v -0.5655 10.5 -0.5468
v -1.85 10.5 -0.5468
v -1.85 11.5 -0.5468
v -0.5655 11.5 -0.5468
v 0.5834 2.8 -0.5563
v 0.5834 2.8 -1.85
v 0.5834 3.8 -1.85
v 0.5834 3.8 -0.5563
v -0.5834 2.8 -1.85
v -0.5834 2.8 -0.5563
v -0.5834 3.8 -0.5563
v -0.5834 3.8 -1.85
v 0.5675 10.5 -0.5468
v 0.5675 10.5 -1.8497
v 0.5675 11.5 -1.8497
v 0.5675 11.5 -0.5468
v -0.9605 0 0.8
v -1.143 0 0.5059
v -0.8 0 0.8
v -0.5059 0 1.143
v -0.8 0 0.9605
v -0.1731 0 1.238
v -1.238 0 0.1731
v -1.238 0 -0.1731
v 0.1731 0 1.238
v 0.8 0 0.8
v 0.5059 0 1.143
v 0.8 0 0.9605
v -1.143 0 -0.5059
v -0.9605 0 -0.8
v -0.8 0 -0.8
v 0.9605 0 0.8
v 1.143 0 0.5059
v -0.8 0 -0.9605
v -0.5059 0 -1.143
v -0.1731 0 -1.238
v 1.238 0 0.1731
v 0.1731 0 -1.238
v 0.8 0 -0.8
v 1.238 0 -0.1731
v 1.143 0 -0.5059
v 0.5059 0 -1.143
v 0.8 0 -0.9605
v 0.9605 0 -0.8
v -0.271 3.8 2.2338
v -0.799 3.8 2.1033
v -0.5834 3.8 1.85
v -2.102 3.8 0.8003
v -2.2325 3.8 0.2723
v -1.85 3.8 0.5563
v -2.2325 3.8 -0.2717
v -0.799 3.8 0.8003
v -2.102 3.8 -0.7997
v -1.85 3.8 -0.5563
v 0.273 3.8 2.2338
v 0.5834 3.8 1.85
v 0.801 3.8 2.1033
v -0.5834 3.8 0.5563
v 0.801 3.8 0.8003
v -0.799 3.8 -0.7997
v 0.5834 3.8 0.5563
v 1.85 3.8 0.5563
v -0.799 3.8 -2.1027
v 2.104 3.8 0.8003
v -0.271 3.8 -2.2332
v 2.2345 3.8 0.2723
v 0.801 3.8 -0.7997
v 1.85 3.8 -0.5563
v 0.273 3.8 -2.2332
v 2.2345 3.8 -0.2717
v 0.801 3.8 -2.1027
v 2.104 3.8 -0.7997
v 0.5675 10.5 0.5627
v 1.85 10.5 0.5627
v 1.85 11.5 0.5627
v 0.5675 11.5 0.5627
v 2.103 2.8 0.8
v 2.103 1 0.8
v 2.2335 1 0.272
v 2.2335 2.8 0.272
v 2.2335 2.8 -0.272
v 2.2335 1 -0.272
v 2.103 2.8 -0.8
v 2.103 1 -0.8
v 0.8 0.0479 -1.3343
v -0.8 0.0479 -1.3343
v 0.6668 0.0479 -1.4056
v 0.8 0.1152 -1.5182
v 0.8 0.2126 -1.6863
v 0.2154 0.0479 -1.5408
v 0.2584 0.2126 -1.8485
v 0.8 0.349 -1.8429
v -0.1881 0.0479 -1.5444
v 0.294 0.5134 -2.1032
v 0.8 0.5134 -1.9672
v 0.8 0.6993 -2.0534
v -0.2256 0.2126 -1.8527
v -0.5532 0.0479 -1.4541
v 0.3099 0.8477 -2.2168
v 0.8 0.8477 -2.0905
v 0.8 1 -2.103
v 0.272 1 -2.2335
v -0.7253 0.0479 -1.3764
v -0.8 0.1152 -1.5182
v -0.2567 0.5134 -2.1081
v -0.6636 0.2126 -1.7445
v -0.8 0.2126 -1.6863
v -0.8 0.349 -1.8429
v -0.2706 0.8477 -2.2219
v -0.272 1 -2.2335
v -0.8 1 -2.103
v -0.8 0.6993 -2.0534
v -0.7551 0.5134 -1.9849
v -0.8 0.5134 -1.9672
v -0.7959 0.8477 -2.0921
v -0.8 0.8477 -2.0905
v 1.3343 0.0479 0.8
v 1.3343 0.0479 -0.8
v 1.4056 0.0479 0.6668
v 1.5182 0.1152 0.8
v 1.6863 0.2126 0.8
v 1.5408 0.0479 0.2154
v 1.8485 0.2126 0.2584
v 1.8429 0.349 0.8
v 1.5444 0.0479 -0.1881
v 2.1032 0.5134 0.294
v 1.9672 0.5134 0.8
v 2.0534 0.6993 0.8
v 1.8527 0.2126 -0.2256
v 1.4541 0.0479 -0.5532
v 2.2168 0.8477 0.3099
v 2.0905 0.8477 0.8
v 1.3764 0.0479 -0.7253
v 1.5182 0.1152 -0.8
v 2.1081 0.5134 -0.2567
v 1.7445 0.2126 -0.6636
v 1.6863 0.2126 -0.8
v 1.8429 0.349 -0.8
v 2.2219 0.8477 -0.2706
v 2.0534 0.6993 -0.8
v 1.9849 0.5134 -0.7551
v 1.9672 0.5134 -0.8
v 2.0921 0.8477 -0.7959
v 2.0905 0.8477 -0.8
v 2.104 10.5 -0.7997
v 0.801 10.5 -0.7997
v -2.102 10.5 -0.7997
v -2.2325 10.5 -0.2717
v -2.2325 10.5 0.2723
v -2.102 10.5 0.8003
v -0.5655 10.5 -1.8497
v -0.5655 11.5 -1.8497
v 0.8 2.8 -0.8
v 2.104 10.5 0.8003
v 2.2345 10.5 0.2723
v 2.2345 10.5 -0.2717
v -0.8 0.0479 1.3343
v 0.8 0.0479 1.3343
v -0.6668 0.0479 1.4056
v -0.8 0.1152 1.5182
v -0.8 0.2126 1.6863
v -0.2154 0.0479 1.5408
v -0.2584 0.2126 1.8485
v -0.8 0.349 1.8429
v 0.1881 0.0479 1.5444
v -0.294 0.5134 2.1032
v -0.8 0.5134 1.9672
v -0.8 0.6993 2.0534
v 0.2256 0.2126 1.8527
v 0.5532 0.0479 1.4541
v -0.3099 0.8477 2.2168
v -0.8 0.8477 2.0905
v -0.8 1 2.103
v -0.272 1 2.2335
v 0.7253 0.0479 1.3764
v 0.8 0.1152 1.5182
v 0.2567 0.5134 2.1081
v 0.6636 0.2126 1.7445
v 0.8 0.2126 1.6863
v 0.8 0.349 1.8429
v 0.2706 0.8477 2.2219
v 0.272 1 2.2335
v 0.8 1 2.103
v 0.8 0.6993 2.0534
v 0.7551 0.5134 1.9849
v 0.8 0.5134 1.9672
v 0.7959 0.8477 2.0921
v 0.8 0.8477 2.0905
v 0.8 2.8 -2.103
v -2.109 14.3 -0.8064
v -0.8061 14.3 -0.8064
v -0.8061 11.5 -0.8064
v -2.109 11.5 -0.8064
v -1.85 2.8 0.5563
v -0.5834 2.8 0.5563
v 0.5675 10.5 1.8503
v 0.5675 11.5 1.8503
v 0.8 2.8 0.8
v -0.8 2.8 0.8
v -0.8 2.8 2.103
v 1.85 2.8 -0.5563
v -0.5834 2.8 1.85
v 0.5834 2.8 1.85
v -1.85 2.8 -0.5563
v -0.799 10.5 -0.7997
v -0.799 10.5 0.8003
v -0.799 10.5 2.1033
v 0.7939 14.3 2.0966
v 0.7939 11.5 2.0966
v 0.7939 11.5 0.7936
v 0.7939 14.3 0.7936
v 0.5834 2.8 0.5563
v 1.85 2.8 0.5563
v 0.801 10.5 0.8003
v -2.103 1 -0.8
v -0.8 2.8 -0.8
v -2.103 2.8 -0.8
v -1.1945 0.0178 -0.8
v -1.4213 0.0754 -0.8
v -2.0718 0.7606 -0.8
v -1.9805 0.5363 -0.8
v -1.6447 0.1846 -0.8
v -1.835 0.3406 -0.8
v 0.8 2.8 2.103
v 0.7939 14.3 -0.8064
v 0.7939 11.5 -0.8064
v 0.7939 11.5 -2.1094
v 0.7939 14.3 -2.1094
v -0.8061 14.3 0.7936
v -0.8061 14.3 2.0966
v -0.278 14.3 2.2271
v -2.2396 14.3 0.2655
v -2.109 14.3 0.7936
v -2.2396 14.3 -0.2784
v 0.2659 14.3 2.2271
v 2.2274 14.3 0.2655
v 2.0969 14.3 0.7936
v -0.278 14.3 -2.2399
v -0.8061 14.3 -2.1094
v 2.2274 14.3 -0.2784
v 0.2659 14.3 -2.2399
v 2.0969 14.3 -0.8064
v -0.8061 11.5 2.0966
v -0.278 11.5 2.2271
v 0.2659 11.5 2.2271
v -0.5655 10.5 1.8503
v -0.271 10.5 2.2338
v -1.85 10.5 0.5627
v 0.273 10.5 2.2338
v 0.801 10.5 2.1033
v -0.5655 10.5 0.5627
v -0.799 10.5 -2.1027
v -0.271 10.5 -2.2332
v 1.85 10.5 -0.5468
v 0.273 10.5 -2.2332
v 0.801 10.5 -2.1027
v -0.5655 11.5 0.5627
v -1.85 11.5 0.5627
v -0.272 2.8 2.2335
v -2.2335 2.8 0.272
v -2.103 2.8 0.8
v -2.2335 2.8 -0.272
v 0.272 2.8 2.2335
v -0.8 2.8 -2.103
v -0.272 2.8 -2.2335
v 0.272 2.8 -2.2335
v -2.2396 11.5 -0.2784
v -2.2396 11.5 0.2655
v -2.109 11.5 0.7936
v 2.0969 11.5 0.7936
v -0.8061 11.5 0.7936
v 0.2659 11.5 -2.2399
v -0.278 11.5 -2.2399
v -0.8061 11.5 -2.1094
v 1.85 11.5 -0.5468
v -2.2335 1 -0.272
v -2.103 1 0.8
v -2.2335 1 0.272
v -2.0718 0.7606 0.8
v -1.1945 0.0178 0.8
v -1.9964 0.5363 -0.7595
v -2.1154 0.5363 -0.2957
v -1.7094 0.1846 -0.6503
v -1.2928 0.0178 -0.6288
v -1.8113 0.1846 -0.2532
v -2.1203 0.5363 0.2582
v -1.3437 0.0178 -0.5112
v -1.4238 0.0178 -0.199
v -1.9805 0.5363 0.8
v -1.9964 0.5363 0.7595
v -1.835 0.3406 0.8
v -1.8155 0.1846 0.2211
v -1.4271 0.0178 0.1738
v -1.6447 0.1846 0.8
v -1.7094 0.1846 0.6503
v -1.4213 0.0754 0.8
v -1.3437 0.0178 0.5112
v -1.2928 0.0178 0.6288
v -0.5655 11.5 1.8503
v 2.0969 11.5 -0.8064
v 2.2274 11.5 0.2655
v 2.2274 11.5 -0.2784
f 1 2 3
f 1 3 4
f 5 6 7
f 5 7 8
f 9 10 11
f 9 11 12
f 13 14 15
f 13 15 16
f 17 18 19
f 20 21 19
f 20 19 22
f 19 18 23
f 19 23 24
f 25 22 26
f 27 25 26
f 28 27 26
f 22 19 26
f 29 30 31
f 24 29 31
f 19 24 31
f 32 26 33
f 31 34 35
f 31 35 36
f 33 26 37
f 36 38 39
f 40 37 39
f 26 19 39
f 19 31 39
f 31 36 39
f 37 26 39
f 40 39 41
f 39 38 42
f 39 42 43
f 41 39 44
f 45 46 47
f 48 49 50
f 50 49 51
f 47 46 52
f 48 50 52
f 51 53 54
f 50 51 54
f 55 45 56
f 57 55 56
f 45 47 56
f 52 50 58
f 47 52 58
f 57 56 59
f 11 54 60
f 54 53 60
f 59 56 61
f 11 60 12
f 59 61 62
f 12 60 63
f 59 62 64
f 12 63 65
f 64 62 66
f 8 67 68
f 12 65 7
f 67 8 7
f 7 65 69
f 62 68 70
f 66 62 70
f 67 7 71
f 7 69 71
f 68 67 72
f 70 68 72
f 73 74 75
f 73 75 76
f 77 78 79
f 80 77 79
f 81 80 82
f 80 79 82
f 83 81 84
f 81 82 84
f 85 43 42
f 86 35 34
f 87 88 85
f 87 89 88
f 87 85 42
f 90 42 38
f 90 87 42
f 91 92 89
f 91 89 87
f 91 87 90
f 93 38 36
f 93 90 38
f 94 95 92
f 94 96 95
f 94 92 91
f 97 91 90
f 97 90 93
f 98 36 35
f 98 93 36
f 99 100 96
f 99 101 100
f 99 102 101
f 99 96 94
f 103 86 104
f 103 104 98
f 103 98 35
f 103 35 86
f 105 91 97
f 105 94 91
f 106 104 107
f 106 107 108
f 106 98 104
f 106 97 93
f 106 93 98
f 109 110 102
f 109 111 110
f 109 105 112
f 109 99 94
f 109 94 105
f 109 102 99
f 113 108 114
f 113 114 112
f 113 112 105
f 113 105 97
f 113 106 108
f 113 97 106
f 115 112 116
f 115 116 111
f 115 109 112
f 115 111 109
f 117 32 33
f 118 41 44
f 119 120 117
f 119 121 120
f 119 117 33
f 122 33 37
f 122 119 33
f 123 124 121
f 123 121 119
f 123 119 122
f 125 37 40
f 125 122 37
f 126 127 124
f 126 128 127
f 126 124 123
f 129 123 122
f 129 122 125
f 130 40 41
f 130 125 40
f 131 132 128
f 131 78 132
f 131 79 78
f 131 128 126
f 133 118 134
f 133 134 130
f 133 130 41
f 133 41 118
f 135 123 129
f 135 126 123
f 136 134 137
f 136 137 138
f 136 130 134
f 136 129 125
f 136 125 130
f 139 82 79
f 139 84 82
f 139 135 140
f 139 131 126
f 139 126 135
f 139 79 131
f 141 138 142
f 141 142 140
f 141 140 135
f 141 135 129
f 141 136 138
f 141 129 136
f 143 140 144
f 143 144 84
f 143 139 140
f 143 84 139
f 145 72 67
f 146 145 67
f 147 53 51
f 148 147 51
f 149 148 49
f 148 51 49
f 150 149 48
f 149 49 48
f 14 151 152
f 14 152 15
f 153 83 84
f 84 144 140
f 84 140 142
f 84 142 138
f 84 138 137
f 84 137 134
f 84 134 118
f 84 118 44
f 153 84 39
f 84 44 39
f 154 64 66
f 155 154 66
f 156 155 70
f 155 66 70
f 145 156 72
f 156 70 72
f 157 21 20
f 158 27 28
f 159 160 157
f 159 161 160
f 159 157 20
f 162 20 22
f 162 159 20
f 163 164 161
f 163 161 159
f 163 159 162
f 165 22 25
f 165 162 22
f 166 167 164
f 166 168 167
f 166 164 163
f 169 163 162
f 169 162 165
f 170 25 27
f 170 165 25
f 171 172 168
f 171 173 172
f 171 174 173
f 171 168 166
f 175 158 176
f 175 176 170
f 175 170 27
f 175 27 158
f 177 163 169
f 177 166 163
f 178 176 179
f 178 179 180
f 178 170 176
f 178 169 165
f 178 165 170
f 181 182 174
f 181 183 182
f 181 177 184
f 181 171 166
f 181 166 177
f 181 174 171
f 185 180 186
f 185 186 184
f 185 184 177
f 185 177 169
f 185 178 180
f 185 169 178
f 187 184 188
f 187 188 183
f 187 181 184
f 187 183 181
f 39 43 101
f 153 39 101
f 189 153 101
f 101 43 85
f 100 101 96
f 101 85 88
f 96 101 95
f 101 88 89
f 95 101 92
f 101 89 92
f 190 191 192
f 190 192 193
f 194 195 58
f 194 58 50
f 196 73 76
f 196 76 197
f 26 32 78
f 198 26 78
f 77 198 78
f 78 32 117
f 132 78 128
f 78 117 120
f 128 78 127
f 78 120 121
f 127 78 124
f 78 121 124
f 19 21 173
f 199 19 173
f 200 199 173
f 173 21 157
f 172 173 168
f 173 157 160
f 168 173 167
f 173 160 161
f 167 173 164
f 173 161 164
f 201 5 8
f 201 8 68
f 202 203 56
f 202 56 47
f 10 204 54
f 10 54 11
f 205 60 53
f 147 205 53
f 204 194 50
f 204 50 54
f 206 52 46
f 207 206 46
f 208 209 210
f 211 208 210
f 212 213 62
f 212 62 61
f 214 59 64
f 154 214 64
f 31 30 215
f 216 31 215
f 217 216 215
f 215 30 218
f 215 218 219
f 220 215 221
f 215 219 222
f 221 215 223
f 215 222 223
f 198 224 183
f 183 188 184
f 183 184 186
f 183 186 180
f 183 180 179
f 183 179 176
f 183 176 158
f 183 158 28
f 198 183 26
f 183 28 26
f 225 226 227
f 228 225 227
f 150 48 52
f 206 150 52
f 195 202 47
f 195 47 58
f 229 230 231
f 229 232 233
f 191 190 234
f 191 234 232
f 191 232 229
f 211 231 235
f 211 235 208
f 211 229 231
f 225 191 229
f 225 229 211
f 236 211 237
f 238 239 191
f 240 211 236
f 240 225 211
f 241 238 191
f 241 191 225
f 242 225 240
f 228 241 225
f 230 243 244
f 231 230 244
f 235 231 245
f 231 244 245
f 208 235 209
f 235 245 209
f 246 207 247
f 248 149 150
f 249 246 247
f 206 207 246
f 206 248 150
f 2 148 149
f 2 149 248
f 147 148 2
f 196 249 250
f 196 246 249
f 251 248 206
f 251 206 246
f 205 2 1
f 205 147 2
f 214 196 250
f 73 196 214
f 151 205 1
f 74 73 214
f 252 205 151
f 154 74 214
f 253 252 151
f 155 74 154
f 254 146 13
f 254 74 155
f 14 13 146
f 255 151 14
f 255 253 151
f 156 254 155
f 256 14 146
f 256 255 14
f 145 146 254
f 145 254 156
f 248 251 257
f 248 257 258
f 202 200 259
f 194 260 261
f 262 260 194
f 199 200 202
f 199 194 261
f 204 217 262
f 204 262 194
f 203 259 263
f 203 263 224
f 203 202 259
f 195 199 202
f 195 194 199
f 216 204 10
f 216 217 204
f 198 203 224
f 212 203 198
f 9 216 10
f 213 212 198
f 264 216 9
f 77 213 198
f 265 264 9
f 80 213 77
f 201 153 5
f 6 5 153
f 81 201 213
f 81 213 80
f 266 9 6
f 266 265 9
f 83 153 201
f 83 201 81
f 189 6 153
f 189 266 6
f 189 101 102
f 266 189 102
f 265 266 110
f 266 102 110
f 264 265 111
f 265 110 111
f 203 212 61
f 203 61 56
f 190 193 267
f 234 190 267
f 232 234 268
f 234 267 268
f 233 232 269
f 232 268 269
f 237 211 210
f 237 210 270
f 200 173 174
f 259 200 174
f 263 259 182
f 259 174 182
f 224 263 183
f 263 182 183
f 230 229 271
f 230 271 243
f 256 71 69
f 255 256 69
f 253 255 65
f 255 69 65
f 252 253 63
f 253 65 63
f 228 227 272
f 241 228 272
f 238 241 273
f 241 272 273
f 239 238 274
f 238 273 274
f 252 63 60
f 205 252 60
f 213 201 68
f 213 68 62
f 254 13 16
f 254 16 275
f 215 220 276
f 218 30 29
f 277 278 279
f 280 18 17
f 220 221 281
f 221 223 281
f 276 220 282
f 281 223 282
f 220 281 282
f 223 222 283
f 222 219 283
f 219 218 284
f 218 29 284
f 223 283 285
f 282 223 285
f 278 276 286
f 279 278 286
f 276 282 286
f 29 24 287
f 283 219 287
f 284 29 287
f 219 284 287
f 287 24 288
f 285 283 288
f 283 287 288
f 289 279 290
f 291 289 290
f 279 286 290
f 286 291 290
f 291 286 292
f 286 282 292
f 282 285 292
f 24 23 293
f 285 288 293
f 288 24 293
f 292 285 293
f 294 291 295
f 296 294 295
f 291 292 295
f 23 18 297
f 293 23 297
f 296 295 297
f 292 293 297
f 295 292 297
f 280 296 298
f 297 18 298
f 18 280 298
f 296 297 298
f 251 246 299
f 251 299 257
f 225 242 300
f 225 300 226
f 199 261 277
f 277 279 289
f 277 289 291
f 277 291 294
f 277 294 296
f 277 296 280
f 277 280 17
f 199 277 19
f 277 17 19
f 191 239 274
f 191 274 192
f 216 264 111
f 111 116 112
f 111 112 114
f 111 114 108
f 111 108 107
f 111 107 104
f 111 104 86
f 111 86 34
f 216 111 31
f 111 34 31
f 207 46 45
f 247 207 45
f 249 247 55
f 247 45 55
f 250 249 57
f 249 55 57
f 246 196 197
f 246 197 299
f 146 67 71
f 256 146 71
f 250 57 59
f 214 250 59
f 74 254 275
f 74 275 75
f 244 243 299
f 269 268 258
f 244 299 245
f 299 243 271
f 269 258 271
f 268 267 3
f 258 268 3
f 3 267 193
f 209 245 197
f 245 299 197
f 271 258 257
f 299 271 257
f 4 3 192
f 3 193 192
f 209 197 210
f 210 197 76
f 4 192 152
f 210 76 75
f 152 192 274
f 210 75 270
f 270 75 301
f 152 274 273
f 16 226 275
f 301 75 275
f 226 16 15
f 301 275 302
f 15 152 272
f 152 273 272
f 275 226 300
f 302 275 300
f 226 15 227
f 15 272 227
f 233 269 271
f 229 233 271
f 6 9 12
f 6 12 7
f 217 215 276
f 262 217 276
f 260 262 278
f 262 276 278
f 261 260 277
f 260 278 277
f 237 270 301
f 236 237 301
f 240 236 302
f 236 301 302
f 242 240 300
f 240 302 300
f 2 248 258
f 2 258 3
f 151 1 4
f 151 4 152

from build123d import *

# Parameters (mm, degrees)
BOSS_EXTRUDE1_DEPTH = 2.8
FILLET1_R           = 1
FILLET2_R           = 1
FILLET3_R           = 1
FILLET4_R           = 1
BOSS_EXTRUDE2_DEPTH = 1
BOSS_EXTRUDE3_DEPTH = 6.7
BOSS_EXTRUDE4_DEPTH = 1
BOSS_EXTRUDE5_DEPTH = 2.8


with BuildPart() as part:
    # Sketch1 → Boss-Extrude1 (new body)
    with BuildSketch(Plane(origin=(0, 0, 0), x_dir=(1, 0, 0), z_dir=(0, 1, 0))):
        with BuildLine():
            Line((-0.8, -0.8), (-0.8, -2.102974084))
            ThreePointArc((-0.8, -2.102974084), (0, -2.25), (0.8, -2.102974084))
            Line((0.8, -2.102974084), (0.8, -0.8))
            Line((0.8, -0.8), (2.102974084, -0.8))
            ThreePointArc((2.102974084, -0.8), (2.25, 0), (2.102974084, 0.8))
            Line((2.102974084, 0.8), (0.8, 0.8))
            Line((0.8, 0.8), (0.8, 2.102974084))
            ThreePointArc((0.8, 2.102974084), (0, 2.25), (-0.8, 2.102974084))
            Line((-0.8, 2.102974084), (-0.8, 0.8))
            Line((-0.8, 0.8), (-2.102974084, 0.8))
            ThreePointArc((-2.102974084, 0.8), (-2.25, 0), (-2.102974084, -0.8))
            Line((-2.102974084, -0.8), (-0.8, -0.8))
        make_face()
    extrude(amount=BOSS_EXTRUDE1_DEPTH)

    # Fillet1
    fillet1_edges = [part.edges().sort_by_distance(p)[0] for p in [
        (-2.25, 0, 0),
    ]]
    fillet(fillet1_edges, radius=FILLET1_R)

    # Fillet2
    fillet2_edges = [part.edges().sort_by_distance(p)[0] for p in [
        (0, 0, 2.25),
    ]]
    fillet(fillet2_edges, radius=FILLET2_R)

    # Fillet3
    fillet3_edges = [part.edges().sort_by_distance(p)[0] for p in [
        (2.25, 0, 0),
    ]]
    fillet(fillet3_edges, radius=FILLET3_R)

    # Fillet4
    fillet4_edges = [part.edges().sort_by_distance(p)[0] for p in [
        (0, 0, -2.25),
    ]]
    fillet(fillet4_edges, radius=FILLET4_R)

    # Sketch3 → Boss-Extrude2 (add)
    with BuildSketch(Plane(origin=(0, 2.8, 0), x_dir=(1, 0, 0), z_dir=(0, 1, 0))):
        Polygon((-0.583389757, 0.556274706), (-0.583389757, 1.85), (0.583389757, 1.85), (0.583389757, 0.556274706), (1.85, 0.556274706), (1.85, -0.556274706), (0.583389757, -0.556274706), (0.583389757, -1.85), (-0.583389757, -1.85), (-0.583389757, -0.556274706), (-1.85, -0.556274706), (-1.85, 0.556274706), align=None)
    extrude(amount=BOSS_EXTRUDE2_DEPTH)

    # Sketch11 → Boss-Extrude3 (add)
    with BuildSketch(Plane(origin=(0, 3.8, 0), x_dir=(1, 0, 0), z_dir=(0, 1, 0))):
        with BuildLine():
            Line((-0.799009338, -0.800292793), (-0.799009338, -2.103266877))
            ThreePointArc((-0.799009338, -2.103266877), (0.000990662, -2.250292793), (0.800990662, -2.103266877))
            Line((0.800990662, -2.103266877), (0.800990662, -0.800292793))
            Line((0.800990662, -0.800292793), (2.103964747, -0.800292793))
            ThreePointArc((2.103964747, -0.800292793), (2.250990662, -0.000292793), (2.103964747, 0.799707207))
            Line((2.103964747, 0.799707207), (0.800990662, 0.799707207))
            Line((0.800990662, 0.799707207), (0.800990662, 2.102681291))
            ThreePointArc((0.800990662, 2.102681291), (0.000990662, 2.249707207), (-0.799009338, 2.102681291))
            Line((-0.799009338, 2.102681291), (-0.799009338, 0.799707207))
            Line((-0.799009338, 0.799707207), (-2.101983422, 0.799707207))
            ThreePointArc((-2.101983422, 0.799707207), (-2.249009338, -0.000292793), (-2.101983422, -0.800292793))
            Line((-2.101983422, -0.800292793), (-0.799009338, -0.800292793))
        make_face()
    extrude(amount=BOSS_EXTRUDE3_DEPTH)

    # Sketch12 → Boss-Extrude4 (add)
    with BuildSketch(Plane(origin=(0, 10.5, 0), x_dir=(1, 0, 0), z_dir=(0, 1, 0))):
        Polygon((0.567460326, 0.546772752), (1.85, 0.546772752), (1.85, -0.562668947), (0.567460326, -0.562668947), (0.567460326, -1.850285006), (-0.565476617, -1.850285006), (-0.565476617, -0.562668947), (-1.85, -0.562668947), (-1.85, 0.546772752), (-0.565476617, 0.546772752), (-0.565476617, 1.849714994), (0.567460326, 1.849714994), align=None)
    extrude(amount=BOSS_EXTRUDE4_DEPTH)

    # Sketch13 → Boss-Extrude5 (add)
    with BuildSketch(Plane(origin=(0, 11.5, 0), x_dir=(1, 0, 0), z_dir=(0, 1, 0))):
        with BuildLine():
            Line((-0.806071321, -0.793579744), (-0.806071321, -2.096553829))
            ThreePointArc((-0.806071321, -2.096553829), (-0.006071321, -2.243579744), (0.793928679, -2.096553829))
            Line((0.793928679, -2.096553829), (0.793928679, -0.793579744))
            Line((0.793928679, -0.793579744), (2.096902763, -0.793579744))
            ThreePointArc((2.096902763, -0.793579744), (2.243928679, 0.006420256), (2.096902763, 0.806420256))
            Line((2.096902763, 0.806420256), (0.793928679, 0.806420256))
            Line((0.793928679, 0.806420256), (0.793928679, 2.10939434))
            ThreePointArc((0.793928679, 2.10939434), (-0.006071321, 2.256420256), (-0.806071321, 2.10939434))
            Line((-0.806071321, 2.10939434), (-0.806071321, 0.806420256))
            Line((-0.806071321, 0.806420256), (-2.109045406, 0.806420256))
            ThreePointArc((-2.109045406, 0.806420256), (-2.256071321, 0.006420256), (-2.109045406, -0.793579744))
            Line((-2.109045406, -0.793579744), (-0.806071321, -0.793579744))
        make_face()
    extrude(amount=BOSS_EXTRUDE5_DEPTH)


solid = part.part
